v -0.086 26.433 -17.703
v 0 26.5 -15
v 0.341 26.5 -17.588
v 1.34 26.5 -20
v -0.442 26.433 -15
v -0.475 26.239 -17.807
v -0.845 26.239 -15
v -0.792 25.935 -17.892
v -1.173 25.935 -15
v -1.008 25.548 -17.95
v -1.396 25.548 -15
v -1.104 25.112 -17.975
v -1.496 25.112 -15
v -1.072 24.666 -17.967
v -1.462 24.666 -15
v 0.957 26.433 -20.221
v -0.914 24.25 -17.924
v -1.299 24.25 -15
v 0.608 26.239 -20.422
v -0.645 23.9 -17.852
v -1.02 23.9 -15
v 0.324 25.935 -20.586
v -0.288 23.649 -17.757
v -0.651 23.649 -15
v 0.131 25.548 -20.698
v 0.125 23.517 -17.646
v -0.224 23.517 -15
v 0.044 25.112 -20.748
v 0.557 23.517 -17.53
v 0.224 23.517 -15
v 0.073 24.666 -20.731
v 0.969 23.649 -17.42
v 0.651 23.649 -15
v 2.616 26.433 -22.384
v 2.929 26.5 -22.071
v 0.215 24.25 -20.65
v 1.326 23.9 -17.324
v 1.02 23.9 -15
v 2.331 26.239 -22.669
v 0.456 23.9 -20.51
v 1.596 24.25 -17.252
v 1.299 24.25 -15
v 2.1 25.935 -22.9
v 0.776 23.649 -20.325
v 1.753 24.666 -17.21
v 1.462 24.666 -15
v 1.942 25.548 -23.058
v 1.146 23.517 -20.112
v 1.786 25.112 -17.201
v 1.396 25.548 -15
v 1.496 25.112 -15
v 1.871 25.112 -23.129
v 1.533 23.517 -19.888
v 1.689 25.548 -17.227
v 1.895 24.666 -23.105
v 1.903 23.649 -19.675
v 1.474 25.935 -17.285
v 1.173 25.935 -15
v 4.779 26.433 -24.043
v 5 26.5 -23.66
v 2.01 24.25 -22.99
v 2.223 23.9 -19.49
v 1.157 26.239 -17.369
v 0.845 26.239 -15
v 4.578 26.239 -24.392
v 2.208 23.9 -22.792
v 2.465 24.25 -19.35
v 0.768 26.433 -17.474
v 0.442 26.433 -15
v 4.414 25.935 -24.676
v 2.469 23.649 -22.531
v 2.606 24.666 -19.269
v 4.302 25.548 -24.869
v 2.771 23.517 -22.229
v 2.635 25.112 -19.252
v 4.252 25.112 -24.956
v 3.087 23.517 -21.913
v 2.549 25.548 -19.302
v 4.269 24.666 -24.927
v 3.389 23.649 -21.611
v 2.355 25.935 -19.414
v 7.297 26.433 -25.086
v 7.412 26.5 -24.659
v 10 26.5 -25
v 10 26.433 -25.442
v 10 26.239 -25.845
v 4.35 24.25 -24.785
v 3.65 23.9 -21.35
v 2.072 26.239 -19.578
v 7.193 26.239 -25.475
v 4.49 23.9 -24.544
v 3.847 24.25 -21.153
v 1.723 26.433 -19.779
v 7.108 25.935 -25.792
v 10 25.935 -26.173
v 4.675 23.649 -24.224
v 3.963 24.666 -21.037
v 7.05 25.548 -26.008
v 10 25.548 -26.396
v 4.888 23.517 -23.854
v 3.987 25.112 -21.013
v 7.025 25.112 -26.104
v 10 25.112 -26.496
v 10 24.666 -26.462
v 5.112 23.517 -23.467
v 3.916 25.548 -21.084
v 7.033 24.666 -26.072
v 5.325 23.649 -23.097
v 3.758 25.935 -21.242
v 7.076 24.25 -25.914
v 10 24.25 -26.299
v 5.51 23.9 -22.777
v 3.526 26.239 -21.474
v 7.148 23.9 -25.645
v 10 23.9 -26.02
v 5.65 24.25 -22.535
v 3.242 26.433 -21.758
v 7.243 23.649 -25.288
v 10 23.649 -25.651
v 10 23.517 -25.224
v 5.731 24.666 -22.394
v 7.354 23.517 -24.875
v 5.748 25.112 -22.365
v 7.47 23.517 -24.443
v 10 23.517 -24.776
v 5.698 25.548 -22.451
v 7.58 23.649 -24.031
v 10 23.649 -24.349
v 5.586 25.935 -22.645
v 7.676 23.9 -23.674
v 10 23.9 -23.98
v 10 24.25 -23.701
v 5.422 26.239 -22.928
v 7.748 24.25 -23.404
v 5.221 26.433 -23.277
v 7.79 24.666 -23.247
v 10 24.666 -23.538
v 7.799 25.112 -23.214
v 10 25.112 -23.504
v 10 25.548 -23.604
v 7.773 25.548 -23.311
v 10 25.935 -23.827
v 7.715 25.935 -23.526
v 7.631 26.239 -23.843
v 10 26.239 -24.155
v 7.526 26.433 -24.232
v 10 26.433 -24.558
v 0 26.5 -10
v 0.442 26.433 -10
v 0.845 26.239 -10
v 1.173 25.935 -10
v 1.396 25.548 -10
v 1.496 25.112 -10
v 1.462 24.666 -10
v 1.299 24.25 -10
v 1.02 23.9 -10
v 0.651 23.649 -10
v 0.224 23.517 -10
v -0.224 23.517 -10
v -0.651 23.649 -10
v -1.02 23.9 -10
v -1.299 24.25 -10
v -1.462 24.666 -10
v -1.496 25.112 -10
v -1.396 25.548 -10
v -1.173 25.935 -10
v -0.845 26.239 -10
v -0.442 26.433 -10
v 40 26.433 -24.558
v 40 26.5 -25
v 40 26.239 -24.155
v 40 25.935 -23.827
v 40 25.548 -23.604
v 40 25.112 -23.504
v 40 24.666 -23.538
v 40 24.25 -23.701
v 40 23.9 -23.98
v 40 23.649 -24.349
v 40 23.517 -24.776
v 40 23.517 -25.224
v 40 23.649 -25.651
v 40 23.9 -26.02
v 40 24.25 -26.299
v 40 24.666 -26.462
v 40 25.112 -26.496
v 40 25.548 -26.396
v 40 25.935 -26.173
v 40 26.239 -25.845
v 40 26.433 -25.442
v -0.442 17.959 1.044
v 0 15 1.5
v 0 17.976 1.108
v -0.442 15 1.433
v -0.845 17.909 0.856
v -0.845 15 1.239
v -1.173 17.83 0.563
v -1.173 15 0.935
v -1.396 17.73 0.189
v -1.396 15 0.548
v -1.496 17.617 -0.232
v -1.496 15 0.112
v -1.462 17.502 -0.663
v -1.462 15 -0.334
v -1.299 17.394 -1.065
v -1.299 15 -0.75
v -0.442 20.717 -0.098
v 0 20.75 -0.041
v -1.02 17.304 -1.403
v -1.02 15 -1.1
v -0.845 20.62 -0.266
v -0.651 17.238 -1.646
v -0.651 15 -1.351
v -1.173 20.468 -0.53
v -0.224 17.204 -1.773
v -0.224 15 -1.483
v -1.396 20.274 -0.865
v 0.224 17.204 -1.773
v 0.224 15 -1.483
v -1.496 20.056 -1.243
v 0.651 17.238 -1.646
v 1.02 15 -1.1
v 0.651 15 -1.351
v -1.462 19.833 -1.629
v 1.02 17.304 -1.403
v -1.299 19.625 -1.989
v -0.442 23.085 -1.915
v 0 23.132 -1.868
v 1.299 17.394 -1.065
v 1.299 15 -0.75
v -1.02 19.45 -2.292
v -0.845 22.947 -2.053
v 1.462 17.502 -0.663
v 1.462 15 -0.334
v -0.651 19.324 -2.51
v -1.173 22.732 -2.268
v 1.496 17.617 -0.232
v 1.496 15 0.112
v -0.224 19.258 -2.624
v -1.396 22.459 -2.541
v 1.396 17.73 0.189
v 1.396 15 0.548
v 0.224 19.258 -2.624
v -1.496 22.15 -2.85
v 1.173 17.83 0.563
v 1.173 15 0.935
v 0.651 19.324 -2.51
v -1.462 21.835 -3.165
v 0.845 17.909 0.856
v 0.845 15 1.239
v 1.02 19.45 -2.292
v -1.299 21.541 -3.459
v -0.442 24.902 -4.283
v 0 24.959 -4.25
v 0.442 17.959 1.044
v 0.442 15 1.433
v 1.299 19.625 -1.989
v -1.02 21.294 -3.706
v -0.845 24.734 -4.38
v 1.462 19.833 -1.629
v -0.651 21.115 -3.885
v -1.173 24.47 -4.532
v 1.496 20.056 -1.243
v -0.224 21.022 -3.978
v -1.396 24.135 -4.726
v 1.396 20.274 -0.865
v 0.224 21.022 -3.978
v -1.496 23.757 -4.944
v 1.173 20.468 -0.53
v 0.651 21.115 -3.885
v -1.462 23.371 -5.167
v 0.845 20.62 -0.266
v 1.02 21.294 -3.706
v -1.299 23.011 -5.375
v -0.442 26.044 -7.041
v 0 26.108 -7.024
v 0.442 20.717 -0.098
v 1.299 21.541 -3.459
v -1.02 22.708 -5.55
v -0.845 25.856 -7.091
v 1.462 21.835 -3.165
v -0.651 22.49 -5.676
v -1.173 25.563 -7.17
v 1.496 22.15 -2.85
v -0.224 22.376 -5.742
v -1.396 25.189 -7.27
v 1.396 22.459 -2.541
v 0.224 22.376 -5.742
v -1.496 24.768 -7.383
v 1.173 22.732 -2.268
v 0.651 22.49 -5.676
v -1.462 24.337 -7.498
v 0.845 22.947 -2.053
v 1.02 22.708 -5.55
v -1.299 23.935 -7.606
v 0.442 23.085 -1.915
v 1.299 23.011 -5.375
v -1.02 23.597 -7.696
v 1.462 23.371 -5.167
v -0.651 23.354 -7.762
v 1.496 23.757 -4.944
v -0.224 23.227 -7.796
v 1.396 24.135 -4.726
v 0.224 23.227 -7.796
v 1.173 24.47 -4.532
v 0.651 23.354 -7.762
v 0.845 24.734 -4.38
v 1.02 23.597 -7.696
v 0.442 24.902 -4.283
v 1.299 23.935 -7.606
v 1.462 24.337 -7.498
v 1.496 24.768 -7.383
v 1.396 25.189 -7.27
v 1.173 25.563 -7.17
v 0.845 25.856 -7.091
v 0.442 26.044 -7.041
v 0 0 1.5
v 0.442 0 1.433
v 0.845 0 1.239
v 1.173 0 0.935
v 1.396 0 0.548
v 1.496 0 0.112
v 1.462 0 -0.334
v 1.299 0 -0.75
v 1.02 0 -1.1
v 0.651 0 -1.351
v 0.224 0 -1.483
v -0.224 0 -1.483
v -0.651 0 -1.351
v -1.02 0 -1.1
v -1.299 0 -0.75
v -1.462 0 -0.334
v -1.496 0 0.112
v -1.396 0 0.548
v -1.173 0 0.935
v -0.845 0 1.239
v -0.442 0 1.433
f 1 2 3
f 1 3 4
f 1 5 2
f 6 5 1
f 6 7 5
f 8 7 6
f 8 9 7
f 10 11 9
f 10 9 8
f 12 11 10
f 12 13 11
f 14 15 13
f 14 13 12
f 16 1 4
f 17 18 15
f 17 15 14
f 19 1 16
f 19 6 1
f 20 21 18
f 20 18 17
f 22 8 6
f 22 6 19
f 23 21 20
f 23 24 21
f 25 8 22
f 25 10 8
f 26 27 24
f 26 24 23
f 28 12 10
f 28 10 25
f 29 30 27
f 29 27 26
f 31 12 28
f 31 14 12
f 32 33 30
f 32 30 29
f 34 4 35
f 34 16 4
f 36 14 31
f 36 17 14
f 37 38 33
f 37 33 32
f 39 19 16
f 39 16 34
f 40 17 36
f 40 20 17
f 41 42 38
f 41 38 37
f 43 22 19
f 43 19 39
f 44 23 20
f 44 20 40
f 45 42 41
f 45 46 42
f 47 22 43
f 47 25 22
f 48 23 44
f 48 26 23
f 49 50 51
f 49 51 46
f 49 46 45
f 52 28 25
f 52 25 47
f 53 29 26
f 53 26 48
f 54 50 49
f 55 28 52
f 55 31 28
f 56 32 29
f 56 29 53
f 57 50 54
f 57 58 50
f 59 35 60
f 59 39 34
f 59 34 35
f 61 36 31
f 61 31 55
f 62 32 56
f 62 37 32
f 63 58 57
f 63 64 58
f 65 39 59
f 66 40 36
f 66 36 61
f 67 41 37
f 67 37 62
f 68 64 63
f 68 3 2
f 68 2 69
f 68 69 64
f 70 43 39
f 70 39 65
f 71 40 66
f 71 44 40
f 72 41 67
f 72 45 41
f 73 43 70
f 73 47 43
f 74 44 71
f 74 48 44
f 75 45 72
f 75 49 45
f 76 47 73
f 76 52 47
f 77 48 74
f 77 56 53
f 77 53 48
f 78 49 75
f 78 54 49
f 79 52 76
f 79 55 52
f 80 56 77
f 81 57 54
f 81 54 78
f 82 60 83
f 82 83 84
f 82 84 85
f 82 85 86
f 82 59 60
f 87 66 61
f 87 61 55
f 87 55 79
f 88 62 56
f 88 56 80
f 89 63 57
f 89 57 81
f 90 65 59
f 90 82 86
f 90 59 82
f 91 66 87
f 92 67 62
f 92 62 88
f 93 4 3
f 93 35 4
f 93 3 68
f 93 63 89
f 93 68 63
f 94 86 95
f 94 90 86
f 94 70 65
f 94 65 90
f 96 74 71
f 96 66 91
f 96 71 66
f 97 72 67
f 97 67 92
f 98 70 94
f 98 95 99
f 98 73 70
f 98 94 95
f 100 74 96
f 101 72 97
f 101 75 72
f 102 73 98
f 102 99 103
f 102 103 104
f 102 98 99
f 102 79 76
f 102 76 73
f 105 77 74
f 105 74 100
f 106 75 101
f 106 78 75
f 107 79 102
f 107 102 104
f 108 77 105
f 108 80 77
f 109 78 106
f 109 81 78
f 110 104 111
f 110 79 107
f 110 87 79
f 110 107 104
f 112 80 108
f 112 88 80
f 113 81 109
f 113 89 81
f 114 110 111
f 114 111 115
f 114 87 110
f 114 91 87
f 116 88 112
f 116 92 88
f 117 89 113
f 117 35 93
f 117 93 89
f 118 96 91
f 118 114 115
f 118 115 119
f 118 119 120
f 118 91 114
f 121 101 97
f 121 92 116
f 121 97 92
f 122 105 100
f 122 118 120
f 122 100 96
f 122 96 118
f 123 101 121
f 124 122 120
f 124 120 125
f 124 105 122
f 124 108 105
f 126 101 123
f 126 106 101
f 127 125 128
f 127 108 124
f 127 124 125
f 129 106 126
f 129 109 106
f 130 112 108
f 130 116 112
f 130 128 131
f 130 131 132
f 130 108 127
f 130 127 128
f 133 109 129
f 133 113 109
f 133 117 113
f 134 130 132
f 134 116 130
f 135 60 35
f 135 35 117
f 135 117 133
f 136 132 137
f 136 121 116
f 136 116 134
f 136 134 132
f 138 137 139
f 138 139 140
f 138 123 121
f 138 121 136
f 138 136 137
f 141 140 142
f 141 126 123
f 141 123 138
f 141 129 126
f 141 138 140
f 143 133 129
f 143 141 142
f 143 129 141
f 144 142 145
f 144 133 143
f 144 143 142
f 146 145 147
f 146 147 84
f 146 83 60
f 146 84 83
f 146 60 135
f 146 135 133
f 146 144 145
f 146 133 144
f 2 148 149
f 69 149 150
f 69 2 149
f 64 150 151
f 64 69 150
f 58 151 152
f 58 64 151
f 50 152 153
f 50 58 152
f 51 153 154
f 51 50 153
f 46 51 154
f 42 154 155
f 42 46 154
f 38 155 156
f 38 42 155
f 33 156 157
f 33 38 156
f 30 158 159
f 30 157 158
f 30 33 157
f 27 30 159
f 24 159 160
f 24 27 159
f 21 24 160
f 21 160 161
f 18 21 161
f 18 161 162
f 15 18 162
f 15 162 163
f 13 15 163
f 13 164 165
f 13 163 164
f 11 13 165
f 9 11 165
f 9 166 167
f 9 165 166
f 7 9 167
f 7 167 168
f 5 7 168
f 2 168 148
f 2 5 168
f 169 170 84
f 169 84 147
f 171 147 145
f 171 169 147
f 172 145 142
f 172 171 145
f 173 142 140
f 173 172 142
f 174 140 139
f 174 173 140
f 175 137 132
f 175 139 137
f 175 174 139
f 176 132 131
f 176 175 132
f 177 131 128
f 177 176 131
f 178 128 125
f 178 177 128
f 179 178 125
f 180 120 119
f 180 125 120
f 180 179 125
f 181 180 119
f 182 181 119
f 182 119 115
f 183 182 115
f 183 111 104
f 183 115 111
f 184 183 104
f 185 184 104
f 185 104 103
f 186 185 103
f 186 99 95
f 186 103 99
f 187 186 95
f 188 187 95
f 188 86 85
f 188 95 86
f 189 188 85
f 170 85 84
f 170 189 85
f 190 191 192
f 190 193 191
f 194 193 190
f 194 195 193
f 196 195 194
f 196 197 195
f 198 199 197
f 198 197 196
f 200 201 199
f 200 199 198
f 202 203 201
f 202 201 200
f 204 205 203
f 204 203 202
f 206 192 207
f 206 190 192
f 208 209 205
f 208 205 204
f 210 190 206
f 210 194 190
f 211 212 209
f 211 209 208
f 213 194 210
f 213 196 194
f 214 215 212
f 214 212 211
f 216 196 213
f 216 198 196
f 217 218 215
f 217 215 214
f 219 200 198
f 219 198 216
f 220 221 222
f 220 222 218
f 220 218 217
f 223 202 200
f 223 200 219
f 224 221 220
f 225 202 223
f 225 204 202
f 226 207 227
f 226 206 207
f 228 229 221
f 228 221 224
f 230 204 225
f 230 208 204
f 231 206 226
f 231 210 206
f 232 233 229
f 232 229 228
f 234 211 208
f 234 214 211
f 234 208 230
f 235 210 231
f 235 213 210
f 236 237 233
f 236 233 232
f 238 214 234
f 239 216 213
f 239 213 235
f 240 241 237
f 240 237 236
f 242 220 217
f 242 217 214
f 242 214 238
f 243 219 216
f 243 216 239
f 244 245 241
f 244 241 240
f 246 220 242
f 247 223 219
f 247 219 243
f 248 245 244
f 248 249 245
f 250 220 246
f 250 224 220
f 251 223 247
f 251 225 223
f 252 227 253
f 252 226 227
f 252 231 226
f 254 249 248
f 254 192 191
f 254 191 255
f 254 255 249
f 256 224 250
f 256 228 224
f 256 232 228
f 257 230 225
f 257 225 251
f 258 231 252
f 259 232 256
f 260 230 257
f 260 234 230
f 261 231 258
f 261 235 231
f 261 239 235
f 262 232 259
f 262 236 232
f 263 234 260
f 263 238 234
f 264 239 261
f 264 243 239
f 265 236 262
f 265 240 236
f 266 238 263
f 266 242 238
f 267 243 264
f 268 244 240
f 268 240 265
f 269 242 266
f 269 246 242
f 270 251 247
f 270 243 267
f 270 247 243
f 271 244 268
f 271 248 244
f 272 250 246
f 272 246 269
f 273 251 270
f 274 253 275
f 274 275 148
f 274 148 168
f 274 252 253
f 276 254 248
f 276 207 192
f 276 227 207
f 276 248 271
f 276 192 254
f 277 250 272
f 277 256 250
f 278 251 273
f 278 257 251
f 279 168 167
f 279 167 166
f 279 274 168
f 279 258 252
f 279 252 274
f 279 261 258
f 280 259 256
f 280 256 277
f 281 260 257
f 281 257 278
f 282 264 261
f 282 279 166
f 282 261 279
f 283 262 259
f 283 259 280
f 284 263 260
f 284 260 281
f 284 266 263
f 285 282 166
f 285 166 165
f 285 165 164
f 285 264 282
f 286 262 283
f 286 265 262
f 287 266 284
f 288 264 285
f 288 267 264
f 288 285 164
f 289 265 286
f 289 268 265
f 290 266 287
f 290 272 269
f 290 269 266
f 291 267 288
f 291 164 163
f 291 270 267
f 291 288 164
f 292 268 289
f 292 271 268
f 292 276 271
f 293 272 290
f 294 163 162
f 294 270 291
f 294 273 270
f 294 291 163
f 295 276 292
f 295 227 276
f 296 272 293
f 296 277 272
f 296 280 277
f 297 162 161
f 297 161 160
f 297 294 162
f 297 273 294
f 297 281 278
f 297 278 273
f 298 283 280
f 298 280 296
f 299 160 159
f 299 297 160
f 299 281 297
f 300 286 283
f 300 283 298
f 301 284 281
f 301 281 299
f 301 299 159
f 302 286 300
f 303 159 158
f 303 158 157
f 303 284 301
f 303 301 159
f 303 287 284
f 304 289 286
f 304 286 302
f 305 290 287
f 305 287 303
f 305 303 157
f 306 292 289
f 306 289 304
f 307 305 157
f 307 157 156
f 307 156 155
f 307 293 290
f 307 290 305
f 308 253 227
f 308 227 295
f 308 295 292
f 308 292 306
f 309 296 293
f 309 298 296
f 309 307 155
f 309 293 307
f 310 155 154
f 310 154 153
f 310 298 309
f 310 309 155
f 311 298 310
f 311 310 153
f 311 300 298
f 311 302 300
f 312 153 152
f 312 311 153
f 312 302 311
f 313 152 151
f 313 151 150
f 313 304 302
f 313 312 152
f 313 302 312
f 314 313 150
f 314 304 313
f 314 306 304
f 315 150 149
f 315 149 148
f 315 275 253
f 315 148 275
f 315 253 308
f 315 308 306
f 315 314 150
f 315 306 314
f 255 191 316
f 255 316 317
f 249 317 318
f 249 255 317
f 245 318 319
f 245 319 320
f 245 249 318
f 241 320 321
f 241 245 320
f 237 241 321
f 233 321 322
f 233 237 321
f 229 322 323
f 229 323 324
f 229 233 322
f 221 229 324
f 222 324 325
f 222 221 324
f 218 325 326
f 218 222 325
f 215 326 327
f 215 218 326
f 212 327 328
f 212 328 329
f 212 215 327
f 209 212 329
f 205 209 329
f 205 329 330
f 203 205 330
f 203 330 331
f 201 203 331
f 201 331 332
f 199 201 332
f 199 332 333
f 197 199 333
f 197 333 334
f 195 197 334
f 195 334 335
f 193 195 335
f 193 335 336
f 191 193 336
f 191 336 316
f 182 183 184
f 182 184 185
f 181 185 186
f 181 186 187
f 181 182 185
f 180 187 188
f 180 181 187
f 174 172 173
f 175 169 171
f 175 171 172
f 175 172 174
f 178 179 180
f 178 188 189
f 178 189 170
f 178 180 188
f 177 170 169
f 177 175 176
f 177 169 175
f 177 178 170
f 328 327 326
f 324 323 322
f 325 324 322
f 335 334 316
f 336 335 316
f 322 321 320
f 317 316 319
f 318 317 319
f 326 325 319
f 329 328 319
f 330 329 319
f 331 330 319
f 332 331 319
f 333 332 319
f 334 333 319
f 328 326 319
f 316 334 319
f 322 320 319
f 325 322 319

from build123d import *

# Parameters (mm, degrees)
BALAYAGE1_PROFILE_R = 1.5


with BuildPart() as part:
    # Balayage1: sweep along a curve in space
    with BuildLine() as balayage1_path:
        Line((0, 0, 0), (0, 15, 0))
        ThreePointArc((0, 15, 0), (0, 22.071067812, -2.928932188), (0, 25, -10))
        Line((0, 25, -10), (0, 25, -15))
        ThreePointArc((0, 25, -15), (2.928932188, 25, -22.071067812), (10, 25, -25))
        Line((10, 25, -25), (40, 25, -25))
    # Balayage1 profile (on start of the path) → Balayage1 (sweep)
    with BuildSketch(Plane.ZX):
        Circle(BALAYAGE1_PROFILE_R)
    sweep(path=balayage1_path.line)


solid = part.part
